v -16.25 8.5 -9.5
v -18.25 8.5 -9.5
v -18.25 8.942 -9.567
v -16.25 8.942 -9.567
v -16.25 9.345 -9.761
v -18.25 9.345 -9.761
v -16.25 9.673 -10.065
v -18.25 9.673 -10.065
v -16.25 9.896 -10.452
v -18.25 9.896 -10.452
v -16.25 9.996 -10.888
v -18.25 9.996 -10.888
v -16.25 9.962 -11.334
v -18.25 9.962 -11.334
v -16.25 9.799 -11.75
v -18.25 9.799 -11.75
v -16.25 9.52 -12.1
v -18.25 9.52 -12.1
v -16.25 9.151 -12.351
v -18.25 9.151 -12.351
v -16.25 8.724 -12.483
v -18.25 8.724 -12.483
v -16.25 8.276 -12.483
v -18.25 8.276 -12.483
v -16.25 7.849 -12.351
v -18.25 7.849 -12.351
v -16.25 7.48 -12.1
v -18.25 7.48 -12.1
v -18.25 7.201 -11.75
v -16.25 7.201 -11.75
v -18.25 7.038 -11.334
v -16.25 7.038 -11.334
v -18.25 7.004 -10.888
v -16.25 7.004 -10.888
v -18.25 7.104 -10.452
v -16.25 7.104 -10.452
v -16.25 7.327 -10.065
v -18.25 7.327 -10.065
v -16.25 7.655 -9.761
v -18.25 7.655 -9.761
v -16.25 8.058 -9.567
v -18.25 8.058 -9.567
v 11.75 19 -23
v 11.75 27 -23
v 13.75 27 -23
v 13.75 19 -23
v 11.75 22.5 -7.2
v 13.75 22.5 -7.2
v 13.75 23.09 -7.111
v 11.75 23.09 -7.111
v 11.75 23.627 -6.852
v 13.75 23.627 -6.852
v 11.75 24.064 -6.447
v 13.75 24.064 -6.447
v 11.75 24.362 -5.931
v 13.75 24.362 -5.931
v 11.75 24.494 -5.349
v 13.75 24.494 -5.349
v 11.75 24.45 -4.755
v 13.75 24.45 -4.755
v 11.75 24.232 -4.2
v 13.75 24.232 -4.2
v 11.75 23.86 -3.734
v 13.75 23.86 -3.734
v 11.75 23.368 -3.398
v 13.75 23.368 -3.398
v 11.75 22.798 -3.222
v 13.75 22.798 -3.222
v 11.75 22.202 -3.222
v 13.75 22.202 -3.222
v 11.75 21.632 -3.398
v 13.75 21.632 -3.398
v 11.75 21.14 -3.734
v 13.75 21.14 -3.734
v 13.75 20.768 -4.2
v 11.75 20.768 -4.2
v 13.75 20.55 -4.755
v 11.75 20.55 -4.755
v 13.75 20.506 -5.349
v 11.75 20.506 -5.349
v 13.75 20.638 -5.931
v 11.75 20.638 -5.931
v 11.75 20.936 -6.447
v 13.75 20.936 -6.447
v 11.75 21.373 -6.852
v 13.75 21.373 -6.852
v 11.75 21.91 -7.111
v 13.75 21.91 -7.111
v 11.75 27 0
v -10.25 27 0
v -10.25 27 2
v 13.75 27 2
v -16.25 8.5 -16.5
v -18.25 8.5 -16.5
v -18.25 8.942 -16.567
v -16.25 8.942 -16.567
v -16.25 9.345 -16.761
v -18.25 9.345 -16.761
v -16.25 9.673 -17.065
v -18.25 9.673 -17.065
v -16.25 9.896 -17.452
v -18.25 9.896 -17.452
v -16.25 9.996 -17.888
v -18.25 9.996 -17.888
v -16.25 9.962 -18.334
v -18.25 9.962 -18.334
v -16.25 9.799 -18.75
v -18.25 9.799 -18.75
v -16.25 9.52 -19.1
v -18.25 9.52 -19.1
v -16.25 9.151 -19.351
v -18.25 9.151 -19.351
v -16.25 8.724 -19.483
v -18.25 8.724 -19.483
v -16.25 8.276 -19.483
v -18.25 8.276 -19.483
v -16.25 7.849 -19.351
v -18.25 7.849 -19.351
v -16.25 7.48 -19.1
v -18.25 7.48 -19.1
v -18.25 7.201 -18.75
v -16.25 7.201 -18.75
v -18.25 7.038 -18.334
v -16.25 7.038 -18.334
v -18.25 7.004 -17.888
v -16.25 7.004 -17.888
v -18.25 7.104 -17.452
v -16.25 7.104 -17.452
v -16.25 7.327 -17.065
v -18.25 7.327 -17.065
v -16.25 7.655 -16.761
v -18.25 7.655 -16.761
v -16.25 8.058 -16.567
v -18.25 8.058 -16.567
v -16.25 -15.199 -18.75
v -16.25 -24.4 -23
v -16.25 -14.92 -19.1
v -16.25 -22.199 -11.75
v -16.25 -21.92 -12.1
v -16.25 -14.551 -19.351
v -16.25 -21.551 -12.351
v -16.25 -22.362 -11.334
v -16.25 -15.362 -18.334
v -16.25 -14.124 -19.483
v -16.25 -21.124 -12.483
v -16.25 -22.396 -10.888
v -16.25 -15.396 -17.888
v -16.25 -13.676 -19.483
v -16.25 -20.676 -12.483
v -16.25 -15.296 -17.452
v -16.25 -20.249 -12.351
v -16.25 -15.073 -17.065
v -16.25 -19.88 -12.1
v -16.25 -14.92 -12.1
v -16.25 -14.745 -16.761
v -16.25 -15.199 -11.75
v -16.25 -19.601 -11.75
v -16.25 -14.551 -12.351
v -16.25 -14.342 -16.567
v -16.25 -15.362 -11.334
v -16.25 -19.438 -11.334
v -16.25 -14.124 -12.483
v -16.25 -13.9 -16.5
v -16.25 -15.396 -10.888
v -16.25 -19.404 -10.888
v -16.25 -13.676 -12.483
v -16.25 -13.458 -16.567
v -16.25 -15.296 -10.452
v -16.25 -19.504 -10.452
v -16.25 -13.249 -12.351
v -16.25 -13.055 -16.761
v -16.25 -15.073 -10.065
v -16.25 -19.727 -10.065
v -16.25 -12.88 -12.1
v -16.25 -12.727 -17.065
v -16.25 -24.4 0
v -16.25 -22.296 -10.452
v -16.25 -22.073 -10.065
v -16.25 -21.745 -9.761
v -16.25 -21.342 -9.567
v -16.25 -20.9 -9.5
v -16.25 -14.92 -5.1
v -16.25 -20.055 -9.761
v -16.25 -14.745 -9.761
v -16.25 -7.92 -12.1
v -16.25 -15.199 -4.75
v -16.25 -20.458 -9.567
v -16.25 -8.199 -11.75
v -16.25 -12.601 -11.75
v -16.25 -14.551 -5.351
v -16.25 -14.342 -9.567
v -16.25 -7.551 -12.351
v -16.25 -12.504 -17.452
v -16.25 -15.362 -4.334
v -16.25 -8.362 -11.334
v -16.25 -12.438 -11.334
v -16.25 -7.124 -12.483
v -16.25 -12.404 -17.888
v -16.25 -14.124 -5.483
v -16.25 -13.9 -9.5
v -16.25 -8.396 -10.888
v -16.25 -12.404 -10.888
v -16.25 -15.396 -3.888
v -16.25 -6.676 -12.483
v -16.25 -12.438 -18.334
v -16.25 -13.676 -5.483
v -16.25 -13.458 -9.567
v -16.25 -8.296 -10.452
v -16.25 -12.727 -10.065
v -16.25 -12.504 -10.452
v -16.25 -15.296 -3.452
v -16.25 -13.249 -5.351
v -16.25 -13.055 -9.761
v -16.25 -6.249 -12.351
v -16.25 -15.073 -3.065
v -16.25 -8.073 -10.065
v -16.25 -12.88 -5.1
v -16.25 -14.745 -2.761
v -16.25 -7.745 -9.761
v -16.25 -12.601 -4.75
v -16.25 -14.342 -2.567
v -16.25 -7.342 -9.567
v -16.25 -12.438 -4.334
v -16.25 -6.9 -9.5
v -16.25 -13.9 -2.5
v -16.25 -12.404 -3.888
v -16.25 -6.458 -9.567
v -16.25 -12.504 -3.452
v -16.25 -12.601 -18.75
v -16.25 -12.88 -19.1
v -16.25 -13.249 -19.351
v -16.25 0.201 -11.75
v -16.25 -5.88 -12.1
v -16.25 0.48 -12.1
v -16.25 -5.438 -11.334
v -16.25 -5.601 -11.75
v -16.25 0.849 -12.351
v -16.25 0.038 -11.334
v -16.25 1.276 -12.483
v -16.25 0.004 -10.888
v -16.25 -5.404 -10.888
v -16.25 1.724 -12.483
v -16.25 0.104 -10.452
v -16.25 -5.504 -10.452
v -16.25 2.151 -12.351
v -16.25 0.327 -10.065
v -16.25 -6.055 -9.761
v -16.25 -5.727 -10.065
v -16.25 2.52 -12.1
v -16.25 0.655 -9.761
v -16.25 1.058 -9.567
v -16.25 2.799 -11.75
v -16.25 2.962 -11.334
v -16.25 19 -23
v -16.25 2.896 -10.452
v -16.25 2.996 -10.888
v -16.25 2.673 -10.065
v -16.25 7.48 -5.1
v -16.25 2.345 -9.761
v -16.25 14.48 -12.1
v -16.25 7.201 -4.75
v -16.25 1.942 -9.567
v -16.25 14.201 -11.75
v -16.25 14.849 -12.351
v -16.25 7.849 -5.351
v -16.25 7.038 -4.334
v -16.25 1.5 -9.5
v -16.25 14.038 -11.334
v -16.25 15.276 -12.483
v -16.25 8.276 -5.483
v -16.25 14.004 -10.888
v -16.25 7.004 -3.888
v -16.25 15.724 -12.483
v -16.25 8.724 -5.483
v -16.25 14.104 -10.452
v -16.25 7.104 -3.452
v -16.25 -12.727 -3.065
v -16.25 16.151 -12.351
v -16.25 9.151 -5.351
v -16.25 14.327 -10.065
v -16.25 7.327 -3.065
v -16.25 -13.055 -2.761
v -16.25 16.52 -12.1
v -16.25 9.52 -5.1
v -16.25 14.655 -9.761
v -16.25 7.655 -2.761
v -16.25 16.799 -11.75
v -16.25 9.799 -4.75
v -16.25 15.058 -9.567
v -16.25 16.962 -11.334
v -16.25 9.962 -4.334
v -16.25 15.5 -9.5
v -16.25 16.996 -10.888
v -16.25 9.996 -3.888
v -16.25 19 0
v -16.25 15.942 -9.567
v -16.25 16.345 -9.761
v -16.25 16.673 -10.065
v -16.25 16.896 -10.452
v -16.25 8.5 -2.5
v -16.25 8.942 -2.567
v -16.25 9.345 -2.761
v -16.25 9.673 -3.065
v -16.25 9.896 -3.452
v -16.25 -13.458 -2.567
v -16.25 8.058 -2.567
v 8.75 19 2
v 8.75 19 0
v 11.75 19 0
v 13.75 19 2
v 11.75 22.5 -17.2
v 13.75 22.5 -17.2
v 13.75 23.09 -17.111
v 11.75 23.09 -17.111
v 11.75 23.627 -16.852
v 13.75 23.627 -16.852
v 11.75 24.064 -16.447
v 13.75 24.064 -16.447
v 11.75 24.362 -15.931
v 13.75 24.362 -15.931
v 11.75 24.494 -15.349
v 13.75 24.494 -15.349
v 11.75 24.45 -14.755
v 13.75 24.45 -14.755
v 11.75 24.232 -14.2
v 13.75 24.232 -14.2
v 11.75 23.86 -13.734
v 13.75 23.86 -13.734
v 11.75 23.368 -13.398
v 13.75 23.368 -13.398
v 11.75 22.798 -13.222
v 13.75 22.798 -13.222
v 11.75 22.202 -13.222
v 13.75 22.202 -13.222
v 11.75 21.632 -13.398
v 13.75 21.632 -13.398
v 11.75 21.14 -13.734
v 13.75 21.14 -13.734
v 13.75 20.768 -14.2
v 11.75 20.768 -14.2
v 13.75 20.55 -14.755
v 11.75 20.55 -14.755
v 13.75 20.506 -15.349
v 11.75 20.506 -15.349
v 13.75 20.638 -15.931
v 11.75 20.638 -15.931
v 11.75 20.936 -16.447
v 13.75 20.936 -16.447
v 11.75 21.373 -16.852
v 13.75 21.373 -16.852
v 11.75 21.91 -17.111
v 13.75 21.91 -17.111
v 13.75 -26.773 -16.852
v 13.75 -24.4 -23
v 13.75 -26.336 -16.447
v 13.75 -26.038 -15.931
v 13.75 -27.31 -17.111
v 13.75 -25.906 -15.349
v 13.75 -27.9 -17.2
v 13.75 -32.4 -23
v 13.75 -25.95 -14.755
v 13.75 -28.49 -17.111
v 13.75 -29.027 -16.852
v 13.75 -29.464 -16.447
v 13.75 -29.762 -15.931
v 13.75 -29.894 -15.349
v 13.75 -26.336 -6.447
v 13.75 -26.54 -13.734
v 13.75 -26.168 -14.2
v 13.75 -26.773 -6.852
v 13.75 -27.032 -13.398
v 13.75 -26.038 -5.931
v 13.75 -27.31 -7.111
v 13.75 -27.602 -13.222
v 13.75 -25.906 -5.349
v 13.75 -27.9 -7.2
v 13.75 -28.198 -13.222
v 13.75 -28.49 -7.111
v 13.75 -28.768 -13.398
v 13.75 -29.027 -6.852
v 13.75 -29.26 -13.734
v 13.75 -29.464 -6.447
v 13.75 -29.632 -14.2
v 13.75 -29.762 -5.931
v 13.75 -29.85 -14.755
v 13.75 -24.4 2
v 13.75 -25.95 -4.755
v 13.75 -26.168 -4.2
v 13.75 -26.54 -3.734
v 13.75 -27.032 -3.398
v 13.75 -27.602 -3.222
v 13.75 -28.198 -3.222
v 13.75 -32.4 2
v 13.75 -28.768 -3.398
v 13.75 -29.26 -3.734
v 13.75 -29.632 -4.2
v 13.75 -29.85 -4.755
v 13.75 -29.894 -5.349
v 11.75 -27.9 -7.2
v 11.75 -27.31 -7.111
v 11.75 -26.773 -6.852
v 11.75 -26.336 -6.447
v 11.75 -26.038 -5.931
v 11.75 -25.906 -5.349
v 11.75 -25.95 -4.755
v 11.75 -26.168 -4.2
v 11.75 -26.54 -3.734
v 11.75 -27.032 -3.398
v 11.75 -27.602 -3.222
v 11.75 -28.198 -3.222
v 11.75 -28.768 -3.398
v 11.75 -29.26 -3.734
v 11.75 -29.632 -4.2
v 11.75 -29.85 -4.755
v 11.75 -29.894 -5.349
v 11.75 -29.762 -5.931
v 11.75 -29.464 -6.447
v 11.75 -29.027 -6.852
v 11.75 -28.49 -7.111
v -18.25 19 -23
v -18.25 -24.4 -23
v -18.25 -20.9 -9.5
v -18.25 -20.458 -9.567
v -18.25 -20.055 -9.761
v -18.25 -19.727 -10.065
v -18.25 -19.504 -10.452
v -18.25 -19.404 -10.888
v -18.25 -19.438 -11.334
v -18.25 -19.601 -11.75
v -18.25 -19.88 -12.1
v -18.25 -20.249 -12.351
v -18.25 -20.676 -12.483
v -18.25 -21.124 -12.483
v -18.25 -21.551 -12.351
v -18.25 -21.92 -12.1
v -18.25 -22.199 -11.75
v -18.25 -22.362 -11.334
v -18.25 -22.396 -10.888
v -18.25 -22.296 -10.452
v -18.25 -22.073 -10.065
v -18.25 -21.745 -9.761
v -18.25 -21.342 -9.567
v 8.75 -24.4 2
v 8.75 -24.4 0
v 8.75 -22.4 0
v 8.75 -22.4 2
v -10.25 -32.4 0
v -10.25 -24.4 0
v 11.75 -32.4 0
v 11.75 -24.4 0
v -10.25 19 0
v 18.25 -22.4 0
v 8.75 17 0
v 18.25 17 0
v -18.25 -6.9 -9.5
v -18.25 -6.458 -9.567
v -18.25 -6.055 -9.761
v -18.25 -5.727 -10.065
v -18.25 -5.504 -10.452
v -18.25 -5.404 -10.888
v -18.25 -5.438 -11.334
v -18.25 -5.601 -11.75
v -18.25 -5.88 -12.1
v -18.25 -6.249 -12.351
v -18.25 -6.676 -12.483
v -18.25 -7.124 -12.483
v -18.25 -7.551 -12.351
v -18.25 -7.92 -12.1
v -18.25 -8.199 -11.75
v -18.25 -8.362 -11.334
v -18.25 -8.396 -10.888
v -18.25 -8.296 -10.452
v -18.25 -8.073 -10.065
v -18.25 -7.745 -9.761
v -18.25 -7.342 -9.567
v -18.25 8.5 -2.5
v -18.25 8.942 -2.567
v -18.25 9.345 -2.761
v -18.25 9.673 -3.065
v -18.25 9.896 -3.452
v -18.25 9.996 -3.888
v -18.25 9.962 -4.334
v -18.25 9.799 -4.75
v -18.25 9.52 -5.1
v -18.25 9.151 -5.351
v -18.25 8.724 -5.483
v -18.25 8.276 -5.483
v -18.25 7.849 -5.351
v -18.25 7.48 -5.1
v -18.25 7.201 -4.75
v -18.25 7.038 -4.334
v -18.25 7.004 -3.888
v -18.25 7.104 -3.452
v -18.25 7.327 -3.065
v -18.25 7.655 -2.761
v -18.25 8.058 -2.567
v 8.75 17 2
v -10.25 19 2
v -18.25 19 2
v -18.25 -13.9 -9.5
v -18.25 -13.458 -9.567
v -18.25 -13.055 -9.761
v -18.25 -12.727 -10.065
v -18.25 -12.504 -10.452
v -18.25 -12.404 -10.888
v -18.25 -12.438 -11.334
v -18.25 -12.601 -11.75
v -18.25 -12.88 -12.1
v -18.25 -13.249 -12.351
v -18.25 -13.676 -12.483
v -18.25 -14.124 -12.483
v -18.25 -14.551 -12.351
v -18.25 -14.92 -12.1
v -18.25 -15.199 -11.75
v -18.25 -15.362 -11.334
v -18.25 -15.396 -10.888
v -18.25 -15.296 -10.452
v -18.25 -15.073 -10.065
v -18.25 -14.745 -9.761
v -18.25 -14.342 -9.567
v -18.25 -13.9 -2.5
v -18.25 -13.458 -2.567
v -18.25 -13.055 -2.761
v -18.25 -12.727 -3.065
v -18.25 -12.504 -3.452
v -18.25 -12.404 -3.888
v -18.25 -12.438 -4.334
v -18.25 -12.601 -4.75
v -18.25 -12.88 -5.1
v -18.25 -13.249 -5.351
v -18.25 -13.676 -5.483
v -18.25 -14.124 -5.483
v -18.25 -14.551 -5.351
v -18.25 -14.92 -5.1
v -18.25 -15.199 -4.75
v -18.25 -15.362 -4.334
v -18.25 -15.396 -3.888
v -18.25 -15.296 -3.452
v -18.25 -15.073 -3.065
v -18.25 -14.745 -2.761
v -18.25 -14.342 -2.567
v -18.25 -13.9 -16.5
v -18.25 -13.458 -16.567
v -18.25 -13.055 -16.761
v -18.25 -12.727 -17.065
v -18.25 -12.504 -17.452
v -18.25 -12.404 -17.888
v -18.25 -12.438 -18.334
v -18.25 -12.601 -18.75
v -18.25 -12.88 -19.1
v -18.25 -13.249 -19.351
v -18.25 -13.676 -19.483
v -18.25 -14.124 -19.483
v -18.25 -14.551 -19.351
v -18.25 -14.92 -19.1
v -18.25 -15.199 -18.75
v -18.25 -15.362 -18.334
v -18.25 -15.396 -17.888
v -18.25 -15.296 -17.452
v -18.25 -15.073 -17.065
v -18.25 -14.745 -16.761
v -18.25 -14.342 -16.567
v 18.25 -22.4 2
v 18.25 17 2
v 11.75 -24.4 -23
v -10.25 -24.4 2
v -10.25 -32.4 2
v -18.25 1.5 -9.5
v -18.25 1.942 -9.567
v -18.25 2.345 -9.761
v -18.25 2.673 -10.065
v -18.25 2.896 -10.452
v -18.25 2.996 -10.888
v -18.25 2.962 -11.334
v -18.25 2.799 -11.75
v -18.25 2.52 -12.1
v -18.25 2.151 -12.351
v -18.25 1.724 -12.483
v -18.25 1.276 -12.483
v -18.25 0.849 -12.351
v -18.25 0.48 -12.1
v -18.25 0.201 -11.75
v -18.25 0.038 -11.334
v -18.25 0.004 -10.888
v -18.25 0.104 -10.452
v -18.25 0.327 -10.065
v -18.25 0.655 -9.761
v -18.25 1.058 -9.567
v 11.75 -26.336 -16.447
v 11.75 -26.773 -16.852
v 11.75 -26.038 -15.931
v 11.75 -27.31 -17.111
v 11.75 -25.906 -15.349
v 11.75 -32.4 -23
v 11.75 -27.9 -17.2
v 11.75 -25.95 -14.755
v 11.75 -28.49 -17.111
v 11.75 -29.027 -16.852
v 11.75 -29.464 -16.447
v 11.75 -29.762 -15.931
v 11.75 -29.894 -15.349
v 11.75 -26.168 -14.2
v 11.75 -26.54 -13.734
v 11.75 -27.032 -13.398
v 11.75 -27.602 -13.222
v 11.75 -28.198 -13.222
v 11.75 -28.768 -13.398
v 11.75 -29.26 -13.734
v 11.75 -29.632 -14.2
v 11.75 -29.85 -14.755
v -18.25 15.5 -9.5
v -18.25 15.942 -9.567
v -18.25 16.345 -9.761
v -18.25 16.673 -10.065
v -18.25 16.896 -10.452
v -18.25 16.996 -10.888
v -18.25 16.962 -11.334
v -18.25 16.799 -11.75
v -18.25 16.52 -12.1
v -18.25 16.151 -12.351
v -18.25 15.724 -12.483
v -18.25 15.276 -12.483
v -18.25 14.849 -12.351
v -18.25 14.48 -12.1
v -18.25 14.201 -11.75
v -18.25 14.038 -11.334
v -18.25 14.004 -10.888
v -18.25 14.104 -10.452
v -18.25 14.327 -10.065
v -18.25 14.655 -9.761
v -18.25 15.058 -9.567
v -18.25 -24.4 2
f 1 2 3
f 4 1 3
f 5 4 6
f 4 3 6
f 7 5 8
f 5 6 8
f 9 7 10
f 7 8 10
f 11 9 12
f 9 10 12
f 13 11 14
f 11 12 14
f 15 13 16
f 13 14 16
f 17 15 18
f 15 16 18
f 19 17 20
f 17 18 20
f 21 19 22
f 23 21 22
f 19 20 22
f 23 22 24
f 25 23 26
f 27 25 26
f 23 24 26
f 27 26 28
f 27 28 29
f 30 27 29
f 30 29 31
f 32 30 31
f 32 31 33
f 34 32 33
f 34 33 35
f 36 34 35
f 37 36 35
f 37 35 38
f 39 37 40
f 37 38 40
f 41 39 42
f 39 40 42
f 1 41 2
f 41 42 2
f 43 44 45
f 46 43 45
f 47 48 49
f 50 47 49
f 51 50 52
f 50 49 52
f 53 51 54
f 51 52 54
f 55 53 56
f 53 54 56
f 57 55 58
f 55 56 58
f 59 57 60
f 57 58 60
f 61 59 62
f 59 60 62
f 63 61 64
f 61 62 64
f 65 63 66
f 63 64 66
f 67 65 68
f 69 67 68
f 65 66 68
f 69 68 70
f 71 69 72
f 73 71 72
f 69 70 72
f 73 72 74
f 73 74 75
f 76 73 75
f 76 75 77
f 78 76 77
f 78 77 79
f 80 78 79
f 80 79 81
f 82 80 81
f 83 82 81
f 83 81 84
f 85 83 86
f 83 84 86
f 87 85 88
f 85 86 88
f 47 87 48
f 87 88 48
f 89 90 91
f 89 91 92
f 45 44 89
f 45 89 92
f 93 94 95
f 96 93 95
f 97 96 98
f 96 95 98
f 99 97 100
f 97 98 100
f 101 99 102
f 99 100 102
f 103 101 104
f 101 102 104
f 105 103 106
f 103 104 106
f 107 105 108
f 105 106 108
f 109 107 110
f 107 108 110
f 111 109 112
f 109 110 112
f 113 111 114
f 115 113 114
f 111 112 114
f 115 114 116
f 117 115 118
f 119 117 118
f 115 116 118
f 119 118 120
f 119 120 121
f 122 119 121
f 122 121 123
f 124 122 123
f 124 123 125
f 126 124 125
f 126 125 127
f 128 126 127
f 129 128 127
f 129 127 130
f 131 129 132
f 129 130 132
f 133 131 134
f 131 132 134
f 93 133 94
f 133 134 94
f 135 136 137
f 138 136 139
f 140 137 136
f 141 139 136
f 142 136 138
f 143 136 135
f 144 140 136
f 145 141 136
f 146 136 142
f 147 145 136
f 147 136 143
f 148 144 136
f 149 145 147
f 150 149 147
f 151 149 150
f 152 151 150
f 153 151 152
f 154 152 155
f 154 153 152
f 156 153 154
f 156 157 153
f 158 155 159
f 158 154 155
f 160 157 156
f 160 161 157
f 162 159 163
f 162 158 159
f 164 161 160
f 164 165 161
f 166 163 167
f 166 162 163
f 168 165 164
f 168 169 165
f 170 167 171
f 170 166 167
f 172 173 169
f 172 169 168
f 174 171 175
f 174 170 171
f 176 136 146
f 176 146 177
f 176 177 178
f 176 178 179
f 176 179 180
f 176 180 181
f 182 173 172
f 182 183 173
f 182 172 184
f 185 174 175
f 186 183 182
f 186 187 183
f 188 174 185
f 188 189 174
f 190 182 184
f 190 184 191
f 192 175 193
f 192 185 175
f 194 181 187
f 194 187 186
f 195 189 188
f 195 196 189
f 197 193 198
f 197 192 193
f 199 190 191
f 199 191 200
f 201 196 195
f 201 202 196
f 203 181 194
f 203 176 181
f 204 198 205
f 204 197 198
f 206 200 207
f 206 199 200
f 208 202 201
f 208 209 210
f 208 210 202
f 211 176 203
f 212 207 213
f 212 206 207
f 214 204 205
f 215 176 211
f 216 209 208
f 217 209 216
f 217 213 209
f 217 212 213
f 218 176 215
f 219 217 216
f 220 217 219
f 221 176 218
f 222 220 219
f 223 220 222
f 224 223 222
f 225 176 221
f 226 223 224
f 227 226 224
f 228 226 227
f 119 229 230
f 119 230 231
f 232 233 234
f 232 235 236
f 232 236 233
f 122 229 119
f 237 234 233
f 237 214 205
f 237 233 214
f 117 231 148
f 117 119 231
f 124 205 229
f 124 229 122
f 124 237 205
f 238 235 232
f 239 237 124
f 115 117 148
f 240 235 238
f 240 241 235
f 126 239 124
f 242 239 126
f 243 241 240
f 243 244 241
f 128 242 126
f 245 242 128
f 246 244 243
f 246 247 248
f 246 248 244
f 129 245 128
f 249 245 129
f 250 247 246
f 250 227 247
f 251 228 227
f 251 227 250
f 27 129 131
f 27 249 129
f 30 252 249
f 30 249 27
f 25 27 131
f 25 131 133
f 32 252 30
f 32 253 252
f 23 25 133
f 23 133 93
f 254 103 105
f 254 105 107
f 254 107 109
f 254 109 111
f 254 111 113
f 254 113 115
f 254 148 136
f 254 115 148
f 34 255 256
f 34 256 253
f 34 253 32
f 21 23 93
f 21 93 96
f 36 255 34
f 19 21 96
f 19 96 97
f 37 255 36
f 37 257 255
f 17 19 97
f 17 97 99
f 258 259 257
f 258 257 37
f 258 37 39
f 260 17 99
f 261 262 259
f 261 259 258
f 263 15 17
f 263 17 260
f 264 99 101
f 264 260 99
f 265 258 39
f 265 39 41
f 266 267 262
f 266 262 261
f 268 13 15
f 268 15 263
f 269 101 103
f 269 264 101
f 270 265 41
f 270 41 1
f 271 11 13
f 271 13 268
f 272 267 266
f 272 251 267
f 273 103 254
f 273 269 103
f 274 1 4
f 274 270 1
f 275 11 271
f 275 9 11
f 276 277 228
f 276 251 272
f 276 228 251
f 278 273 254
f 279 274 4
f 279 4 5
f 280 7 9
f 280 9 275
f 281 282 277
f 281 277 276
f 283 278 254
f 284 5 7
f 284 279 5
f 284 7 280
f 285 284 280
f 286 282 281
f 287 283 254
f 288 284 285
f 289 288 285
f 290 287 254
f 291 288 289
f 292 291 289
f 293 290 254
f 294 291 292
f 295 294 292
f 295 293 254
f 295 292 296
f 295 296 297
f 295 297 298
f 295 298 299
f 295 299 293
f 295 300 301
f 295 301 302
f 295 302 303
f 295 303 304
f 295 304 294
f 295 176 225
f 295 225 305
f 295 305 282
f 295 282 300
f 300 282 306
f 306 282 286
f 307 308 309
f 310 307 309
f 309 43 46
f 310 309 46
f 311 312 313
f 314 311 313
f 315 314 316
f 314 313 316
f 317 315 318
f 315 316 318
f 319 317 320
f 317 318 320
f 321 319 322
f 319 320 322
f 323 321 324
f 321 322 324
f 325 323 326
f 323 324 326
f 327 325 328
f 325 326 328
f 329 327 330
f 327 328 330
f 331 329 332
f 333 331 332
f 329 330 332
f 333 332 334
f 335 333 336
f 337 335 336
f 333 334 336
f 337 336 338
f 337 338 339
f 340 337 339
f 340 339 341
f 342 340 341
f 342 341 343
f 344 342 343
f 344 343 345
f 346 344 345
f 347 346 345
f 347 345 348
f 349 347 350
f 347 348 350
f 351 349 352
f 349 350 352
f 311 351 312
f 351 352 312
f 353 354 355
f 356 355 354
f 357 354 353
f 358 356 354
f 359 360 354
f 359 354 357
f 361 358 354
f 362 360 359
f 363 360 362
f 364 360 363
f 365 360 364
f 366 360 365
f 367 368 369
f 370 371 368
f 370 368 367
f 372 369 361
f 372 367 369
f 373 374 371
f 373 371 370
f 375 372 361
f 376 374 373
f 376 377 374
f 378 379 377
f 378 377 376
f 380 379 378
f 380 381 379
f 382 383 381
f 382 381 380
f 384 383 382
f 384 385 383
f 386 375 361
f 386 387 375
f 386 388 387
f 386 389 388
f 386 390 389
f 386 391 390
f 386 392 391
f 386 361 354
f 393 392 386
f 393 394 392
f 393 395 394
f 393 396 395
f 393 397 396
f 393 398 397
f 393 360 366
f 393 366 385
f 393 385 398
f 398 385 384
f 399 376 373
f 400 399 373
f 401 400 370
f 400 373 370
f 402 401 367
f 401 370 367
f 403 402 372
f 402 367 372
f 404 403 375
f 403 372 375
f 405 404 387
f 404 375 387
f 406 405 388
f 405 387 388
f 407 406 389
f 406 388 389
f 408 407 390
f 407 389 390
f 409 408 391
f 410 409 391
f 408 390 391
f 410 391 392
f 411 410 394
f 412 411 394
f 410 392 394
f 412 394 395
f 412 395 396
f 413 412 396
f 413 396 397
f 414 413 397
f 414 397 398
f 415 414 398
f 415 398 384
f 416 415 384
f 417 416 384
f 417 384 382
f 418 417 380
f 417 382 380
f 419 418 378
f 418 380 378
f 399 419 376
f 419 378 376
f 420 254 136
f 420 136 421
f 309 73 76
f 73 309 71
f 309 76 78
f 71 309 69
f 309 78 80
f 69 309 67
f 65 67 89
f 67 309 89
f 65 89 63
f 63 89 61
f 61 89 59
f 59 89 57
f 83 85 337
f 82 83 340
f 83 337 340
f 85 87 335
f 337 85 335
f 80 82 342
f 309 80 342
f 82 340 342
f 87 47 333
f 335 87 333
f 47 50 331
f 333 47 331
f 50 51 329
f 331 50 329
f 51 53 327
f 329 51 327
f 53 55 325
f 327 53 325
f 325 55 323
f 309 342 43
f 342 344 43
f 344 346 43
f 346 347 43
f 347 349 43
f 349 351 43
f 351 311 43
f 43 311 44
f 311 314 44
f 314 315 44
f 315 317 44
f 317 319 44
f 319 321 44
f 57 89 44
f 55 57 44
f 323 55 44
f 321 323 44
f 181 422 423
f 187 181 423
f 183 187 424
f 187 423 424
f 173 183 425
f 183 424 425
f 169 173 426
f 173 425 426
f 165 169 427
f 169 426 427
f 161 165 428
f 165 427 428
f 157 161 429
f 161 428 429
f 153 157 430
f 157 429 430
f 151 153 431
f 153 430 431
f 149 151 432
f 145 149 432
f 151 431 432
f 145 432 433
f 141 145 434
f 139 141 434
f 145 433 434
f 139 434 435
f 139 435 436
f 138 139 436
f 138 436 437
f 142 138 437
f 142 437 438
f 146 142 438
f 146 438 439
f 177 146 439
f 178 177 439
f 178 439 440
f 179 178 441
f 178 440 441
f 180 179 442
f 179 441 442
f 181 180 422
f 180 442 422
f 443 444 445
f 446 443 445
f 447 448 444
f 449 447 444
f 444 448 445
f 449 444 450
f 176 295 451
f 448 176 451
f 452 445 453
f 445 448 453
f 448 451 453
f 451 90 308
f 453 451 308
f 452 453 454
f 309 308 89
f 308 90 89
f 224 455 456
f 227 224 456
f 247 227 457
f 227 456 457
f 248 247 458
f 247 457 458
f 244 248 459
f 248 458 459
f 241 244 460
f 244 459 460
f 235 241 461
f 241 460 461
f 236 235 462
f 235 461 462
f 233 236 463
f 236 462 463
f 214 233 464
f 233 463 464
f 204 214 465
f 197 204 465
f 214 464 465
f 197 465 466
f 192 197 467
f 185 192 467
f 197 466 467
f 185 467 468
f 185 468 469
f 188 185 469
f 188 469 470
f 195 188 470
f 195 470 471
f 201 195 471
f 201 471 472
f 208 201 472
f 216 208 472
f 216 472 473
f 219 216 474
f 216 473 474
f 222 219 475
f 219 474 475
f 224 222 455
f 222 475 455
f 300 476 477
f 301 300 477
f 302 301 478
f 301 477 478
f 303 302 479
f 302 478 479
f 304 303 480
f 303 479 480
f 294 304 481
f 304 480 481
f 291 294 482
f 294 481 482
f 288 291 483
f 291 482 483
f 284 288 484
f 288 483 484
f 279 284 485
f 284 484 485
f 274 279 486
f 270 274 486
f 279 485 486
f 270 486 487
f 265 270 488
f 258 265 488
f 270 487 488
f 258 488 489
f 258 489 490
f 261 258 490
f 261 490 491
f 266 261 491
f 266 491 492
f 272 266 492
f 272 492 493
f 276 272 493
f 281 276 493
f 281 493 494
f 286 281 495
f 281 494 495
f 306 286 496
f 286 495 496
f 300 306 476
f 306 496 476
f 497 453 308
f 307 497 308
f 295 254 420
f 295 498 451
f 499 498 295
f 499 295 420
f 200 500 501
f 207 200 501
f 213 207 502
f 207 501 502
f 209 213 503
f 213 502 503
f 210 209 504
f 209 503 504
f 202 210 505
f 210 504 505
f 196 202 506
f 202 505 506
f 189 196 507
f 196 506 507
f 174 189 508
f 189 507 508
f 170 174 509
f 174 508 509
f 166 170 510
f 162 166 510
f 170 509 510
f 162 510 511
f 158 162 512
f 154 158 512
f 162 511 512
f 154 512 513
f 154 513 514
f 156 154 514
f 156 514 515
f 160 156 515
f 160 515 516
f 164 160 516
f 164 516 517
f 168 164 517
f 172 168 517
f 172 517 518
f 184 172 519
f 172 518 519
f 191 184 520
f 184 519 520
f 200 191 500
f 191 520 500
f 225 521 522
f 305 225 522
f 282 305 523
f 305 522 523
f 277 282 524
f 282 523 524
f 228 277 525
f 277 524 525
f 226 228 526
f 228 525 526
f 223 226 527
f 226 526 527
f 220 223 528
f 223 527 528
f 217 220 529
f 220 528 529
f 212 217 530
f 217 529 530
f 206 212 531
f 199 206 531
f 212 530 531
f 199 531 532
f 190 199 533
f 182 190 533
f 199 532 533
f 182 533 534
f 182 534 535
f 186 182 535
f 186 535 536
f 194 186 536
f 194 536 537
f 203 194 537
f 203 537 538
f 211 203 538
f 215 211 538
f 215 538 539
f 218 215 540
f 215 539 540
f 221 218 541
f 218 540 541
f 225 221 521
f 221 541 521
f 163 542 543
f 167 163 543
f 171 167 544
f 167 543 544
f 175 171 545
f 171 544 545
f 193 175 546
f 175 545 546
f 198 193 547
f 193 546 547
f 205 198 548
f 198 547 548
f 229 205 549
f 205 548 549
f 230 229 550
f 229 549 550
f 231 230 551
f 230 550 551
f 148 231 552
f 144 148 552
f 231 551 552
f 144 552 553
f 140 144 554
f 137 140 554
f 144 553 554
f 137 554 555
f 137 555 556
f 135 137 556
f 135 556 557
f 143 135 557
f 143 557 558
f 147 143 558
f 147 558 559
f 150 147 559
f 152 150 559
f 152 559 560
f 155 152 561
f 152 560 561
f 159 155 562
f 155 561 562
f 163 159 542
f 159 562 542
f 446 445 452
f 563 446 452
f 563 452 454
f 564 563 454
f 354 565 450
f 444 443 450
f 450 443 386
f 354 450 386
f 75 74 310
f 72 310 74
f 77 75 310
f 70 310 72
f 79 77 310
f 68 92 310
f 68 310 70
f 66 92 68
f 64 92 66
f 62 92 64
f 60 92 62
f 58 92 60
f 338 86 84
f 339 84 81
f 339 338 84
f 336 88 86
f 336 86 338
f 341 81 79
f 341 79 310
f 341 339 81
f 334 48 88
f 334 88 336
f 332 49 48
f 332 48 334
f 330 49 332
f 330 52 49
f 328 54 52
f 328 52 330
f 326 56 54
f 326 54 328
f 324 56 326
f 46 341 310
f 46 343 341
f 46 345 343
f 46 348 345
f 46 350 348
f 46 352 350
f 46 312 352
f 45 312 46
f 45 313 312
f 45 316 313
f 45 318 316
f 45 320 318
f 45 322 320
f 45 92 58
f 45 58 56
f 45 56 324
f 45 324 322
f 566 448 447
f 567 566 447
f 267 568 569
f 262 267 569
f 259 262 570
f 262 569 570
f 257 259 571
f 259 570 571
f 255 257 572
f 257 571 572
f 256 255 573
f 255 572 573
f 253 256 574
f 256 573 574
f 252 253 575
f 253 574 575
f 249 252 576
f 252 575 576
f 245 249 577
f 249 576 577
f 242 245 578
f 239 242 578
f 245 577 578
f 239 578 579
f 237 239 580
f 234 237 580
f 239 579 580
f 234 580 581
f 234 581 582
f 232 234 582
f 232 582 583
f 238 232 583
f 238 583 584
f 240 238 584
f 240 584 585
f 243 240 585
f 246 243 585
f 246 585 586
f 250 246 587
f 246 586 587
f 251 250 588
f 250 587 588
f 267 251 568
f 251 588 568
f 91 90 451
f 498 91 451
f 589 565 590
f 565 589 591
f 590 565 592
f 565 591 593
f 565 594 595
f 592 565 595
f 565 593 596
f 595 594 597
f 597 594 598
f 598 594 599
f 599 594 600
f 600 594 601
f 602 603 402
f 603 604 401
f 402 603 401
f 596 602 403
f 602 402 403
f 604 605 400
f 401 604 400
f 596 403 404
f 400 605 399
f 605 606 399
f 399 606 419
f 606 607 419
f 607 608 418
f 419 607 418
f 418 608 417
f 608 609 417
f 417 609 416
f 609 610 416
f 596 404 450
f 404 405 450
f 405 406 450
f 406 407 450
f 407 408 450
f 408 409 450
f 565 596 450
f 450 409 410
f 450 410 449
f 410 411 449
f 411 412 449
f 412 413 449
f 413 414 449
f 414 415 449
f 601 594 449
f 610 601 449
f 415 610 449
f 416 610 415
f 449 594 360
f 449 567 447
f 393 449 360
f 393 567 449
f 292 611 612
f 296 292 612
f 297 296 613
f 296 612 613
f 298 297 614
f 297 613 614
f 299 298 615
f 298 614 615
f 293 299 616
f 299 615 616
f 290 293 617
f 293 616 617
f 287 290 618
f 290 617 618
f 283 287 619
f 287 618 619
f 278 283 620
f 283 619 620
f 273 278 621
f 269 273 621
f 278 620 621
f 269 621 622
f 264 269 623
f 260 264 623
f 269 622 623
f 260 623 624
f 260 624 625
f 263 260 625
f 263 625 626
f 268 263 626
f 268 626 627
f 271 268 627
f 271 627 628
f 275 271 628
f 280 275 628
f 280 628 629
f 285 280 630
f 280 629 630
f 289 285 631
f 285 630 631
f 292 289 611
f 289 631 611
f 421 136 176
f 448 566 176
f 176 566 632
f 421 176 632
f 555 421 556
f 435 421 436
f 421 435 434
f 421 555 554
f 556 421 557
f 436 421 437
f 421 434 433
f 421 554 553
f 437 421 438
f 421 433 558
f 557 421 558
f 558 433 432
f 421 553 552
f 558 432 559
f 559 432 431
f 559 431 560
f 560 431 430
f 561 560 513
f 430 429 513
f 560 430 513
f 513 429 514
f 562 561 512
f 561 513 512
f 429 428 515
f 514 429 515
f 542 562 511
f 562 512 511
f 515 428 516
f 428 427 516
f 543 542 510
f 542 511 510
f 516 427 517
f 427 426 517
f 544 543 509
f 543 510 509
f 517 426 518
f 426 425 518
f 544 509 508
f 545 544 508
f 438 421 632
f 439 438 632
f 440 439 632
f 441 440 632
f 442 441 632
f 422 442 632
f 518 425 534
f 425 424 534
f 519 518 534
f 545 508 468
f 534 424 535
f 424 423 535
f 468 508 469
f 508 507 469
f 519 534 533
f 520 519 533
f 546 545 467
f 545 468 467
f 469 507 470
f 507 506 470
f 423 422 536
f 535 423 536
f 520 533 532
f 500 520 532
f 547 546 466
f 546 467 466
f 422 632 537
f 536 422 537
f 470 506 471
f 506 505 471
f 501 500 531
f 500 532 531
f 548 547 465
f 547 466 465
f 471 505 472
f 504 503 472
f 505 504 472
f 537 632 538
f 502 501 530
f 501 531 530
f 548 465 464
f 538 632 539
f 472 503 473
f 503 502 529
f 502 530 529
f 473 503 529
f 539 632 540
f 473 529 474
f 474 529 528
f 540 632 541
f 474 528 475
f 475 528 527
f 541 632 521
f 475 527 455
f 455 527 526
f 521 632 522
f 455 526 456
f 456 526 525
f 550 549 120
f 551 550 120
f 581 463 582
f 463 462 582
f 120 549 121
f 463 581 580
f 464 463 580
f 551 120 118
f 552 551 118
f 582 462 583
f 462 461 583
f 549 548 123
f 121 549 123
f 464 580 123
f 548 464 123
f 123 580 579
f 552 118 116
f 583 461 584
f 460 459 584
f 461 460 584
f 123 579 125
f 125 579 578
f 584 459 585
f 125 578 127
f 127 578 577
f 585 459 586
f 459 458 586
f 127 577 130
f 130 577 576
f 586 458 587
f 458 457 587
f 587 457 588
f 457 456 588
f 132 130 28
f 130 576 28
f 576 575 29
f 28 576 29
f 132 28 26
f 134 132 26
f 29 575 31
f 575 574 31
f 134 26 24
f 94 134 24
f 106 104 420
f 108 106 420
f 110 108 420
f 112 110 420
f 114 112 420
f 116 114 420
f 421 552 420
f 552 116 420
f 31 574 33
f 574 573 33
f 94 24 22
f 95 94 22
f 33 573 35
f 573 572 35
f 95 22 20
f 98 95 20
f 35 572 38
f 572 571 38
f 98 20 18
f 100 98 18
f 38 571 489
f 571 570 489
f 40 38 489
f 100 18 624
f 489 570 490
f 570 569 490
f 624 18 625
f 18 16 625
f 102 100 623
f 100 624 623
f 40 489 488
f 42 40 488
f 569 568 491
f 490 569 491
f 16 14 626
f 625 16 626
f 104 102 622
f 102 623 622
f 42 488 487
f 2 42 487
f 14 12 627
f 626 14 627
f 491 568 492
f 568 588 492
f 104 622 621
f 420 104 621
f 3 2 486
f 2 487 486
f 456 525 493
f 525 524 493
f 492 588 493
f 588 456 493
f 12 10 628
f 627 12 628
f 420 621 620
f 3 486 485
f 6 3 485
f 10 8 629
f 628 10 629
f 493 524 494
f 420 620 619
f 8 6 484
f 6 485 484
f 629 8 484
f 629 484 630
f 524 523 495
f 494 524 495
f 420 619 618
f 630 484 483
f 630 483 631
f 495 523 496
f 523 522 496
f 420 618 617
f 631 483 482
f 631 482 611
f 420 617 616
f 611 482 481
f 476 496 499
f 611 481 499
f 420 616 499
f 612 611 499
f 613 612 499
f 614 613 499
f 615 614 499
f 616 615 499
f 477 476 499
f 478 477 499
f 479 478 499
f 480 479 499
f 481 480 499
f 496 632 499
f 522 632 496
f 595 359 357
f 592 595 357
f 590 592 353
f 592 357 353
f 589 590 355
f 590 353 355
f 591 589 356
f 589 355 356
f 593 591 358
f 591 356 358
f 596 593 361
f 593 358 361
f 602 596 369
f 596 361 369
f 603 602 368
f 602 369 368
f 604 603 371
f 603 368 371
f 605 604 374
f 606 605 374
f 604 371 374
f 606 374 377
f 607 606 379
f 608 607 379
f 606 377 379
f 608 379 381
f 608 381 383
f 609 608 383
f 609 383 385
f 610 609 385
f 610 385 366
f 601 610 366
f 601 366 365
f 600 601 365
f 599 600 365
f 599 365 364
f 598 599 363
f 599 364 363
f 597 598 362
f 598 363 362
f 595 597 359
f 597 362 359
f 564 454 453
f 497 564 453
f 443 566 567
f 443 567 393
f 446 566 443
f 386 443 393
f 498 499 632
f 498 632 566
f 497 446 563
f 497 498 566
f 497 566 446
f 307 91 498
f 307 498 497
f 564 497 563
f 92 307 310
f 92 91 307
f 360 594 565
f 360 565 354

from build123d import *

# Parameters (mm, degrees)
BOSS_EXTRU_1_DEPTH      = 2
ESQUISSE2_W             = 2
ESQUISSE2_H             = 43.4
BOSS_EXTRU_2_DEPTH      = 23
ESQUISSE3_W             = 2
ESQUISSE3_H             = 23
BOSS_EXTRU_3_DEPTH      = 8
ESQUISSE8_W             = 2
ESQUISSE8_H             = 23
BOSS_EXTRU_5_DEPTH      = 8
ESQUISSE9_R             = 2
ENL_V_MAT_EXTRU_3_DEPTH = 2
ESQUISSE10_R            = 1.5
ENL_V_MAT_EXTRU_4_DEPTH = 2


with BuildPart() as part:
    # Esquisse1 → Boss.-Extru.1 (new body)
    with BuildSketch(Plane.XY):
        Polygon((8.75, 17), (8.75, 19), (13.75, 19), (13.75, 27), (-10.25, 27), (-10.25, 19), (-18.25, 19), (-18.25, -24.4), (-10.25, -24.4), (-10.25, -32.4), (13.75, -32.4), (13.75, -24.4), (8.75, -24.4), (8.75, -22.4), (18.25, -22.4), (18.25, 17), align=None)
    extrude(amount=BOSS_EXTRU_1_DEPTH)

    # Esquisse2 → Boss.-Extru.2 (add)
    with BuildSketch(Plane(origin=(0, 0, 0), x_dir=(-1, 0, 0), z_dir=(0, 0, -1))):
        with Locations((17.25, -2.7)):
            Rectangle(ESQUISSE2_W, ESQUISSE2_H)
    extrude(amount=BOSS_EXTRU_2_DEPTH)

    # Esquisse3 → Boss.-Extru.3 (add)
    with BuildSketch(Plane(origin=(0, 27, 0), x_dir=(1, 0, 0), z_dir=(0, 1, 0))):
        with Locations((12.75, 11.5)):
            Rectangle(ESQUISSE3_W, ESQUISSE3_H)
    extrude(amount=-BOSS_EXTRU_3_DEPTH)

    # Esquisse8 → Boss.-Extru.5 (add)
    with BuildSketch(Plane.XZ.offset(32.4)):
        with Locations((12.75, -11.5)):
            Rectangle(ESQUISSE8_W, ESQUISSE8_H)
    extrude(amount=-BOSS_EXTRU_5_DEPTH)

    # Esquisse9 → Enlèv. mat.-Extru.3 (cut)
    with BuildSketch(Plane(origin=(13.75, 0, 0), x_dir=(0, 0, -1), z_dir=(1, 0, 0))):
        with Locations((5.2, 22.5)):
            Circle(ESQUISSE9_R)
        with Locations((15.2, 22.5)):
            Circle(ESQUISSE9_R)
        with Locations((15.2, -27.9)):
            Circle(ESQUISSE9_R)
        with Locations((5.2, -27.9)):
            Circle(ESQUISSE9_R)
    extrude(amount=-ENL_V_MAT_EXTRU_3_DEPTH, mode=Mode.SUBTRACT)

    # Esquisse10 → Enlèv. mat.-Extru.4 (cut)
    with BuildSketch(Plane.ZY.offset(18.25)):
        with Locations((-11, 15.5)):
            Circle(ESQUISSE10_R)
        with Locations((-11, 8.5)):
            Circle(ESQUISSE10_R)
        with Locations((-4, 8.5)):
            Circle(ESQUISSE10_R)
        with Locations((-11, 1.5)):
            Circle(ESQUISSE10_R)
        with Locations((-18, 8.5)):
            Circle(ESQUISSE10_R)
        with Locations((-11, -6.9)):
            Circle(ESQUISSE10_R)
        with Locations((-11, -13.9)):
            Circle(ESQUISSE10_R)
        with Locations((-4, -13.9)):
            Circle(ESQUISSE10_R)
        with Locations((-18, -13.9)):
            Circle(ESQUISSE10_R)
        with Locations((-11, -20.9)):
            Circle(ESQUISSE10_R)
    extrude(amount=-ENL_V_MAT_EXTRU_4_DEPTH, mode=Mode.SUBTRACT)


solid = part.part
